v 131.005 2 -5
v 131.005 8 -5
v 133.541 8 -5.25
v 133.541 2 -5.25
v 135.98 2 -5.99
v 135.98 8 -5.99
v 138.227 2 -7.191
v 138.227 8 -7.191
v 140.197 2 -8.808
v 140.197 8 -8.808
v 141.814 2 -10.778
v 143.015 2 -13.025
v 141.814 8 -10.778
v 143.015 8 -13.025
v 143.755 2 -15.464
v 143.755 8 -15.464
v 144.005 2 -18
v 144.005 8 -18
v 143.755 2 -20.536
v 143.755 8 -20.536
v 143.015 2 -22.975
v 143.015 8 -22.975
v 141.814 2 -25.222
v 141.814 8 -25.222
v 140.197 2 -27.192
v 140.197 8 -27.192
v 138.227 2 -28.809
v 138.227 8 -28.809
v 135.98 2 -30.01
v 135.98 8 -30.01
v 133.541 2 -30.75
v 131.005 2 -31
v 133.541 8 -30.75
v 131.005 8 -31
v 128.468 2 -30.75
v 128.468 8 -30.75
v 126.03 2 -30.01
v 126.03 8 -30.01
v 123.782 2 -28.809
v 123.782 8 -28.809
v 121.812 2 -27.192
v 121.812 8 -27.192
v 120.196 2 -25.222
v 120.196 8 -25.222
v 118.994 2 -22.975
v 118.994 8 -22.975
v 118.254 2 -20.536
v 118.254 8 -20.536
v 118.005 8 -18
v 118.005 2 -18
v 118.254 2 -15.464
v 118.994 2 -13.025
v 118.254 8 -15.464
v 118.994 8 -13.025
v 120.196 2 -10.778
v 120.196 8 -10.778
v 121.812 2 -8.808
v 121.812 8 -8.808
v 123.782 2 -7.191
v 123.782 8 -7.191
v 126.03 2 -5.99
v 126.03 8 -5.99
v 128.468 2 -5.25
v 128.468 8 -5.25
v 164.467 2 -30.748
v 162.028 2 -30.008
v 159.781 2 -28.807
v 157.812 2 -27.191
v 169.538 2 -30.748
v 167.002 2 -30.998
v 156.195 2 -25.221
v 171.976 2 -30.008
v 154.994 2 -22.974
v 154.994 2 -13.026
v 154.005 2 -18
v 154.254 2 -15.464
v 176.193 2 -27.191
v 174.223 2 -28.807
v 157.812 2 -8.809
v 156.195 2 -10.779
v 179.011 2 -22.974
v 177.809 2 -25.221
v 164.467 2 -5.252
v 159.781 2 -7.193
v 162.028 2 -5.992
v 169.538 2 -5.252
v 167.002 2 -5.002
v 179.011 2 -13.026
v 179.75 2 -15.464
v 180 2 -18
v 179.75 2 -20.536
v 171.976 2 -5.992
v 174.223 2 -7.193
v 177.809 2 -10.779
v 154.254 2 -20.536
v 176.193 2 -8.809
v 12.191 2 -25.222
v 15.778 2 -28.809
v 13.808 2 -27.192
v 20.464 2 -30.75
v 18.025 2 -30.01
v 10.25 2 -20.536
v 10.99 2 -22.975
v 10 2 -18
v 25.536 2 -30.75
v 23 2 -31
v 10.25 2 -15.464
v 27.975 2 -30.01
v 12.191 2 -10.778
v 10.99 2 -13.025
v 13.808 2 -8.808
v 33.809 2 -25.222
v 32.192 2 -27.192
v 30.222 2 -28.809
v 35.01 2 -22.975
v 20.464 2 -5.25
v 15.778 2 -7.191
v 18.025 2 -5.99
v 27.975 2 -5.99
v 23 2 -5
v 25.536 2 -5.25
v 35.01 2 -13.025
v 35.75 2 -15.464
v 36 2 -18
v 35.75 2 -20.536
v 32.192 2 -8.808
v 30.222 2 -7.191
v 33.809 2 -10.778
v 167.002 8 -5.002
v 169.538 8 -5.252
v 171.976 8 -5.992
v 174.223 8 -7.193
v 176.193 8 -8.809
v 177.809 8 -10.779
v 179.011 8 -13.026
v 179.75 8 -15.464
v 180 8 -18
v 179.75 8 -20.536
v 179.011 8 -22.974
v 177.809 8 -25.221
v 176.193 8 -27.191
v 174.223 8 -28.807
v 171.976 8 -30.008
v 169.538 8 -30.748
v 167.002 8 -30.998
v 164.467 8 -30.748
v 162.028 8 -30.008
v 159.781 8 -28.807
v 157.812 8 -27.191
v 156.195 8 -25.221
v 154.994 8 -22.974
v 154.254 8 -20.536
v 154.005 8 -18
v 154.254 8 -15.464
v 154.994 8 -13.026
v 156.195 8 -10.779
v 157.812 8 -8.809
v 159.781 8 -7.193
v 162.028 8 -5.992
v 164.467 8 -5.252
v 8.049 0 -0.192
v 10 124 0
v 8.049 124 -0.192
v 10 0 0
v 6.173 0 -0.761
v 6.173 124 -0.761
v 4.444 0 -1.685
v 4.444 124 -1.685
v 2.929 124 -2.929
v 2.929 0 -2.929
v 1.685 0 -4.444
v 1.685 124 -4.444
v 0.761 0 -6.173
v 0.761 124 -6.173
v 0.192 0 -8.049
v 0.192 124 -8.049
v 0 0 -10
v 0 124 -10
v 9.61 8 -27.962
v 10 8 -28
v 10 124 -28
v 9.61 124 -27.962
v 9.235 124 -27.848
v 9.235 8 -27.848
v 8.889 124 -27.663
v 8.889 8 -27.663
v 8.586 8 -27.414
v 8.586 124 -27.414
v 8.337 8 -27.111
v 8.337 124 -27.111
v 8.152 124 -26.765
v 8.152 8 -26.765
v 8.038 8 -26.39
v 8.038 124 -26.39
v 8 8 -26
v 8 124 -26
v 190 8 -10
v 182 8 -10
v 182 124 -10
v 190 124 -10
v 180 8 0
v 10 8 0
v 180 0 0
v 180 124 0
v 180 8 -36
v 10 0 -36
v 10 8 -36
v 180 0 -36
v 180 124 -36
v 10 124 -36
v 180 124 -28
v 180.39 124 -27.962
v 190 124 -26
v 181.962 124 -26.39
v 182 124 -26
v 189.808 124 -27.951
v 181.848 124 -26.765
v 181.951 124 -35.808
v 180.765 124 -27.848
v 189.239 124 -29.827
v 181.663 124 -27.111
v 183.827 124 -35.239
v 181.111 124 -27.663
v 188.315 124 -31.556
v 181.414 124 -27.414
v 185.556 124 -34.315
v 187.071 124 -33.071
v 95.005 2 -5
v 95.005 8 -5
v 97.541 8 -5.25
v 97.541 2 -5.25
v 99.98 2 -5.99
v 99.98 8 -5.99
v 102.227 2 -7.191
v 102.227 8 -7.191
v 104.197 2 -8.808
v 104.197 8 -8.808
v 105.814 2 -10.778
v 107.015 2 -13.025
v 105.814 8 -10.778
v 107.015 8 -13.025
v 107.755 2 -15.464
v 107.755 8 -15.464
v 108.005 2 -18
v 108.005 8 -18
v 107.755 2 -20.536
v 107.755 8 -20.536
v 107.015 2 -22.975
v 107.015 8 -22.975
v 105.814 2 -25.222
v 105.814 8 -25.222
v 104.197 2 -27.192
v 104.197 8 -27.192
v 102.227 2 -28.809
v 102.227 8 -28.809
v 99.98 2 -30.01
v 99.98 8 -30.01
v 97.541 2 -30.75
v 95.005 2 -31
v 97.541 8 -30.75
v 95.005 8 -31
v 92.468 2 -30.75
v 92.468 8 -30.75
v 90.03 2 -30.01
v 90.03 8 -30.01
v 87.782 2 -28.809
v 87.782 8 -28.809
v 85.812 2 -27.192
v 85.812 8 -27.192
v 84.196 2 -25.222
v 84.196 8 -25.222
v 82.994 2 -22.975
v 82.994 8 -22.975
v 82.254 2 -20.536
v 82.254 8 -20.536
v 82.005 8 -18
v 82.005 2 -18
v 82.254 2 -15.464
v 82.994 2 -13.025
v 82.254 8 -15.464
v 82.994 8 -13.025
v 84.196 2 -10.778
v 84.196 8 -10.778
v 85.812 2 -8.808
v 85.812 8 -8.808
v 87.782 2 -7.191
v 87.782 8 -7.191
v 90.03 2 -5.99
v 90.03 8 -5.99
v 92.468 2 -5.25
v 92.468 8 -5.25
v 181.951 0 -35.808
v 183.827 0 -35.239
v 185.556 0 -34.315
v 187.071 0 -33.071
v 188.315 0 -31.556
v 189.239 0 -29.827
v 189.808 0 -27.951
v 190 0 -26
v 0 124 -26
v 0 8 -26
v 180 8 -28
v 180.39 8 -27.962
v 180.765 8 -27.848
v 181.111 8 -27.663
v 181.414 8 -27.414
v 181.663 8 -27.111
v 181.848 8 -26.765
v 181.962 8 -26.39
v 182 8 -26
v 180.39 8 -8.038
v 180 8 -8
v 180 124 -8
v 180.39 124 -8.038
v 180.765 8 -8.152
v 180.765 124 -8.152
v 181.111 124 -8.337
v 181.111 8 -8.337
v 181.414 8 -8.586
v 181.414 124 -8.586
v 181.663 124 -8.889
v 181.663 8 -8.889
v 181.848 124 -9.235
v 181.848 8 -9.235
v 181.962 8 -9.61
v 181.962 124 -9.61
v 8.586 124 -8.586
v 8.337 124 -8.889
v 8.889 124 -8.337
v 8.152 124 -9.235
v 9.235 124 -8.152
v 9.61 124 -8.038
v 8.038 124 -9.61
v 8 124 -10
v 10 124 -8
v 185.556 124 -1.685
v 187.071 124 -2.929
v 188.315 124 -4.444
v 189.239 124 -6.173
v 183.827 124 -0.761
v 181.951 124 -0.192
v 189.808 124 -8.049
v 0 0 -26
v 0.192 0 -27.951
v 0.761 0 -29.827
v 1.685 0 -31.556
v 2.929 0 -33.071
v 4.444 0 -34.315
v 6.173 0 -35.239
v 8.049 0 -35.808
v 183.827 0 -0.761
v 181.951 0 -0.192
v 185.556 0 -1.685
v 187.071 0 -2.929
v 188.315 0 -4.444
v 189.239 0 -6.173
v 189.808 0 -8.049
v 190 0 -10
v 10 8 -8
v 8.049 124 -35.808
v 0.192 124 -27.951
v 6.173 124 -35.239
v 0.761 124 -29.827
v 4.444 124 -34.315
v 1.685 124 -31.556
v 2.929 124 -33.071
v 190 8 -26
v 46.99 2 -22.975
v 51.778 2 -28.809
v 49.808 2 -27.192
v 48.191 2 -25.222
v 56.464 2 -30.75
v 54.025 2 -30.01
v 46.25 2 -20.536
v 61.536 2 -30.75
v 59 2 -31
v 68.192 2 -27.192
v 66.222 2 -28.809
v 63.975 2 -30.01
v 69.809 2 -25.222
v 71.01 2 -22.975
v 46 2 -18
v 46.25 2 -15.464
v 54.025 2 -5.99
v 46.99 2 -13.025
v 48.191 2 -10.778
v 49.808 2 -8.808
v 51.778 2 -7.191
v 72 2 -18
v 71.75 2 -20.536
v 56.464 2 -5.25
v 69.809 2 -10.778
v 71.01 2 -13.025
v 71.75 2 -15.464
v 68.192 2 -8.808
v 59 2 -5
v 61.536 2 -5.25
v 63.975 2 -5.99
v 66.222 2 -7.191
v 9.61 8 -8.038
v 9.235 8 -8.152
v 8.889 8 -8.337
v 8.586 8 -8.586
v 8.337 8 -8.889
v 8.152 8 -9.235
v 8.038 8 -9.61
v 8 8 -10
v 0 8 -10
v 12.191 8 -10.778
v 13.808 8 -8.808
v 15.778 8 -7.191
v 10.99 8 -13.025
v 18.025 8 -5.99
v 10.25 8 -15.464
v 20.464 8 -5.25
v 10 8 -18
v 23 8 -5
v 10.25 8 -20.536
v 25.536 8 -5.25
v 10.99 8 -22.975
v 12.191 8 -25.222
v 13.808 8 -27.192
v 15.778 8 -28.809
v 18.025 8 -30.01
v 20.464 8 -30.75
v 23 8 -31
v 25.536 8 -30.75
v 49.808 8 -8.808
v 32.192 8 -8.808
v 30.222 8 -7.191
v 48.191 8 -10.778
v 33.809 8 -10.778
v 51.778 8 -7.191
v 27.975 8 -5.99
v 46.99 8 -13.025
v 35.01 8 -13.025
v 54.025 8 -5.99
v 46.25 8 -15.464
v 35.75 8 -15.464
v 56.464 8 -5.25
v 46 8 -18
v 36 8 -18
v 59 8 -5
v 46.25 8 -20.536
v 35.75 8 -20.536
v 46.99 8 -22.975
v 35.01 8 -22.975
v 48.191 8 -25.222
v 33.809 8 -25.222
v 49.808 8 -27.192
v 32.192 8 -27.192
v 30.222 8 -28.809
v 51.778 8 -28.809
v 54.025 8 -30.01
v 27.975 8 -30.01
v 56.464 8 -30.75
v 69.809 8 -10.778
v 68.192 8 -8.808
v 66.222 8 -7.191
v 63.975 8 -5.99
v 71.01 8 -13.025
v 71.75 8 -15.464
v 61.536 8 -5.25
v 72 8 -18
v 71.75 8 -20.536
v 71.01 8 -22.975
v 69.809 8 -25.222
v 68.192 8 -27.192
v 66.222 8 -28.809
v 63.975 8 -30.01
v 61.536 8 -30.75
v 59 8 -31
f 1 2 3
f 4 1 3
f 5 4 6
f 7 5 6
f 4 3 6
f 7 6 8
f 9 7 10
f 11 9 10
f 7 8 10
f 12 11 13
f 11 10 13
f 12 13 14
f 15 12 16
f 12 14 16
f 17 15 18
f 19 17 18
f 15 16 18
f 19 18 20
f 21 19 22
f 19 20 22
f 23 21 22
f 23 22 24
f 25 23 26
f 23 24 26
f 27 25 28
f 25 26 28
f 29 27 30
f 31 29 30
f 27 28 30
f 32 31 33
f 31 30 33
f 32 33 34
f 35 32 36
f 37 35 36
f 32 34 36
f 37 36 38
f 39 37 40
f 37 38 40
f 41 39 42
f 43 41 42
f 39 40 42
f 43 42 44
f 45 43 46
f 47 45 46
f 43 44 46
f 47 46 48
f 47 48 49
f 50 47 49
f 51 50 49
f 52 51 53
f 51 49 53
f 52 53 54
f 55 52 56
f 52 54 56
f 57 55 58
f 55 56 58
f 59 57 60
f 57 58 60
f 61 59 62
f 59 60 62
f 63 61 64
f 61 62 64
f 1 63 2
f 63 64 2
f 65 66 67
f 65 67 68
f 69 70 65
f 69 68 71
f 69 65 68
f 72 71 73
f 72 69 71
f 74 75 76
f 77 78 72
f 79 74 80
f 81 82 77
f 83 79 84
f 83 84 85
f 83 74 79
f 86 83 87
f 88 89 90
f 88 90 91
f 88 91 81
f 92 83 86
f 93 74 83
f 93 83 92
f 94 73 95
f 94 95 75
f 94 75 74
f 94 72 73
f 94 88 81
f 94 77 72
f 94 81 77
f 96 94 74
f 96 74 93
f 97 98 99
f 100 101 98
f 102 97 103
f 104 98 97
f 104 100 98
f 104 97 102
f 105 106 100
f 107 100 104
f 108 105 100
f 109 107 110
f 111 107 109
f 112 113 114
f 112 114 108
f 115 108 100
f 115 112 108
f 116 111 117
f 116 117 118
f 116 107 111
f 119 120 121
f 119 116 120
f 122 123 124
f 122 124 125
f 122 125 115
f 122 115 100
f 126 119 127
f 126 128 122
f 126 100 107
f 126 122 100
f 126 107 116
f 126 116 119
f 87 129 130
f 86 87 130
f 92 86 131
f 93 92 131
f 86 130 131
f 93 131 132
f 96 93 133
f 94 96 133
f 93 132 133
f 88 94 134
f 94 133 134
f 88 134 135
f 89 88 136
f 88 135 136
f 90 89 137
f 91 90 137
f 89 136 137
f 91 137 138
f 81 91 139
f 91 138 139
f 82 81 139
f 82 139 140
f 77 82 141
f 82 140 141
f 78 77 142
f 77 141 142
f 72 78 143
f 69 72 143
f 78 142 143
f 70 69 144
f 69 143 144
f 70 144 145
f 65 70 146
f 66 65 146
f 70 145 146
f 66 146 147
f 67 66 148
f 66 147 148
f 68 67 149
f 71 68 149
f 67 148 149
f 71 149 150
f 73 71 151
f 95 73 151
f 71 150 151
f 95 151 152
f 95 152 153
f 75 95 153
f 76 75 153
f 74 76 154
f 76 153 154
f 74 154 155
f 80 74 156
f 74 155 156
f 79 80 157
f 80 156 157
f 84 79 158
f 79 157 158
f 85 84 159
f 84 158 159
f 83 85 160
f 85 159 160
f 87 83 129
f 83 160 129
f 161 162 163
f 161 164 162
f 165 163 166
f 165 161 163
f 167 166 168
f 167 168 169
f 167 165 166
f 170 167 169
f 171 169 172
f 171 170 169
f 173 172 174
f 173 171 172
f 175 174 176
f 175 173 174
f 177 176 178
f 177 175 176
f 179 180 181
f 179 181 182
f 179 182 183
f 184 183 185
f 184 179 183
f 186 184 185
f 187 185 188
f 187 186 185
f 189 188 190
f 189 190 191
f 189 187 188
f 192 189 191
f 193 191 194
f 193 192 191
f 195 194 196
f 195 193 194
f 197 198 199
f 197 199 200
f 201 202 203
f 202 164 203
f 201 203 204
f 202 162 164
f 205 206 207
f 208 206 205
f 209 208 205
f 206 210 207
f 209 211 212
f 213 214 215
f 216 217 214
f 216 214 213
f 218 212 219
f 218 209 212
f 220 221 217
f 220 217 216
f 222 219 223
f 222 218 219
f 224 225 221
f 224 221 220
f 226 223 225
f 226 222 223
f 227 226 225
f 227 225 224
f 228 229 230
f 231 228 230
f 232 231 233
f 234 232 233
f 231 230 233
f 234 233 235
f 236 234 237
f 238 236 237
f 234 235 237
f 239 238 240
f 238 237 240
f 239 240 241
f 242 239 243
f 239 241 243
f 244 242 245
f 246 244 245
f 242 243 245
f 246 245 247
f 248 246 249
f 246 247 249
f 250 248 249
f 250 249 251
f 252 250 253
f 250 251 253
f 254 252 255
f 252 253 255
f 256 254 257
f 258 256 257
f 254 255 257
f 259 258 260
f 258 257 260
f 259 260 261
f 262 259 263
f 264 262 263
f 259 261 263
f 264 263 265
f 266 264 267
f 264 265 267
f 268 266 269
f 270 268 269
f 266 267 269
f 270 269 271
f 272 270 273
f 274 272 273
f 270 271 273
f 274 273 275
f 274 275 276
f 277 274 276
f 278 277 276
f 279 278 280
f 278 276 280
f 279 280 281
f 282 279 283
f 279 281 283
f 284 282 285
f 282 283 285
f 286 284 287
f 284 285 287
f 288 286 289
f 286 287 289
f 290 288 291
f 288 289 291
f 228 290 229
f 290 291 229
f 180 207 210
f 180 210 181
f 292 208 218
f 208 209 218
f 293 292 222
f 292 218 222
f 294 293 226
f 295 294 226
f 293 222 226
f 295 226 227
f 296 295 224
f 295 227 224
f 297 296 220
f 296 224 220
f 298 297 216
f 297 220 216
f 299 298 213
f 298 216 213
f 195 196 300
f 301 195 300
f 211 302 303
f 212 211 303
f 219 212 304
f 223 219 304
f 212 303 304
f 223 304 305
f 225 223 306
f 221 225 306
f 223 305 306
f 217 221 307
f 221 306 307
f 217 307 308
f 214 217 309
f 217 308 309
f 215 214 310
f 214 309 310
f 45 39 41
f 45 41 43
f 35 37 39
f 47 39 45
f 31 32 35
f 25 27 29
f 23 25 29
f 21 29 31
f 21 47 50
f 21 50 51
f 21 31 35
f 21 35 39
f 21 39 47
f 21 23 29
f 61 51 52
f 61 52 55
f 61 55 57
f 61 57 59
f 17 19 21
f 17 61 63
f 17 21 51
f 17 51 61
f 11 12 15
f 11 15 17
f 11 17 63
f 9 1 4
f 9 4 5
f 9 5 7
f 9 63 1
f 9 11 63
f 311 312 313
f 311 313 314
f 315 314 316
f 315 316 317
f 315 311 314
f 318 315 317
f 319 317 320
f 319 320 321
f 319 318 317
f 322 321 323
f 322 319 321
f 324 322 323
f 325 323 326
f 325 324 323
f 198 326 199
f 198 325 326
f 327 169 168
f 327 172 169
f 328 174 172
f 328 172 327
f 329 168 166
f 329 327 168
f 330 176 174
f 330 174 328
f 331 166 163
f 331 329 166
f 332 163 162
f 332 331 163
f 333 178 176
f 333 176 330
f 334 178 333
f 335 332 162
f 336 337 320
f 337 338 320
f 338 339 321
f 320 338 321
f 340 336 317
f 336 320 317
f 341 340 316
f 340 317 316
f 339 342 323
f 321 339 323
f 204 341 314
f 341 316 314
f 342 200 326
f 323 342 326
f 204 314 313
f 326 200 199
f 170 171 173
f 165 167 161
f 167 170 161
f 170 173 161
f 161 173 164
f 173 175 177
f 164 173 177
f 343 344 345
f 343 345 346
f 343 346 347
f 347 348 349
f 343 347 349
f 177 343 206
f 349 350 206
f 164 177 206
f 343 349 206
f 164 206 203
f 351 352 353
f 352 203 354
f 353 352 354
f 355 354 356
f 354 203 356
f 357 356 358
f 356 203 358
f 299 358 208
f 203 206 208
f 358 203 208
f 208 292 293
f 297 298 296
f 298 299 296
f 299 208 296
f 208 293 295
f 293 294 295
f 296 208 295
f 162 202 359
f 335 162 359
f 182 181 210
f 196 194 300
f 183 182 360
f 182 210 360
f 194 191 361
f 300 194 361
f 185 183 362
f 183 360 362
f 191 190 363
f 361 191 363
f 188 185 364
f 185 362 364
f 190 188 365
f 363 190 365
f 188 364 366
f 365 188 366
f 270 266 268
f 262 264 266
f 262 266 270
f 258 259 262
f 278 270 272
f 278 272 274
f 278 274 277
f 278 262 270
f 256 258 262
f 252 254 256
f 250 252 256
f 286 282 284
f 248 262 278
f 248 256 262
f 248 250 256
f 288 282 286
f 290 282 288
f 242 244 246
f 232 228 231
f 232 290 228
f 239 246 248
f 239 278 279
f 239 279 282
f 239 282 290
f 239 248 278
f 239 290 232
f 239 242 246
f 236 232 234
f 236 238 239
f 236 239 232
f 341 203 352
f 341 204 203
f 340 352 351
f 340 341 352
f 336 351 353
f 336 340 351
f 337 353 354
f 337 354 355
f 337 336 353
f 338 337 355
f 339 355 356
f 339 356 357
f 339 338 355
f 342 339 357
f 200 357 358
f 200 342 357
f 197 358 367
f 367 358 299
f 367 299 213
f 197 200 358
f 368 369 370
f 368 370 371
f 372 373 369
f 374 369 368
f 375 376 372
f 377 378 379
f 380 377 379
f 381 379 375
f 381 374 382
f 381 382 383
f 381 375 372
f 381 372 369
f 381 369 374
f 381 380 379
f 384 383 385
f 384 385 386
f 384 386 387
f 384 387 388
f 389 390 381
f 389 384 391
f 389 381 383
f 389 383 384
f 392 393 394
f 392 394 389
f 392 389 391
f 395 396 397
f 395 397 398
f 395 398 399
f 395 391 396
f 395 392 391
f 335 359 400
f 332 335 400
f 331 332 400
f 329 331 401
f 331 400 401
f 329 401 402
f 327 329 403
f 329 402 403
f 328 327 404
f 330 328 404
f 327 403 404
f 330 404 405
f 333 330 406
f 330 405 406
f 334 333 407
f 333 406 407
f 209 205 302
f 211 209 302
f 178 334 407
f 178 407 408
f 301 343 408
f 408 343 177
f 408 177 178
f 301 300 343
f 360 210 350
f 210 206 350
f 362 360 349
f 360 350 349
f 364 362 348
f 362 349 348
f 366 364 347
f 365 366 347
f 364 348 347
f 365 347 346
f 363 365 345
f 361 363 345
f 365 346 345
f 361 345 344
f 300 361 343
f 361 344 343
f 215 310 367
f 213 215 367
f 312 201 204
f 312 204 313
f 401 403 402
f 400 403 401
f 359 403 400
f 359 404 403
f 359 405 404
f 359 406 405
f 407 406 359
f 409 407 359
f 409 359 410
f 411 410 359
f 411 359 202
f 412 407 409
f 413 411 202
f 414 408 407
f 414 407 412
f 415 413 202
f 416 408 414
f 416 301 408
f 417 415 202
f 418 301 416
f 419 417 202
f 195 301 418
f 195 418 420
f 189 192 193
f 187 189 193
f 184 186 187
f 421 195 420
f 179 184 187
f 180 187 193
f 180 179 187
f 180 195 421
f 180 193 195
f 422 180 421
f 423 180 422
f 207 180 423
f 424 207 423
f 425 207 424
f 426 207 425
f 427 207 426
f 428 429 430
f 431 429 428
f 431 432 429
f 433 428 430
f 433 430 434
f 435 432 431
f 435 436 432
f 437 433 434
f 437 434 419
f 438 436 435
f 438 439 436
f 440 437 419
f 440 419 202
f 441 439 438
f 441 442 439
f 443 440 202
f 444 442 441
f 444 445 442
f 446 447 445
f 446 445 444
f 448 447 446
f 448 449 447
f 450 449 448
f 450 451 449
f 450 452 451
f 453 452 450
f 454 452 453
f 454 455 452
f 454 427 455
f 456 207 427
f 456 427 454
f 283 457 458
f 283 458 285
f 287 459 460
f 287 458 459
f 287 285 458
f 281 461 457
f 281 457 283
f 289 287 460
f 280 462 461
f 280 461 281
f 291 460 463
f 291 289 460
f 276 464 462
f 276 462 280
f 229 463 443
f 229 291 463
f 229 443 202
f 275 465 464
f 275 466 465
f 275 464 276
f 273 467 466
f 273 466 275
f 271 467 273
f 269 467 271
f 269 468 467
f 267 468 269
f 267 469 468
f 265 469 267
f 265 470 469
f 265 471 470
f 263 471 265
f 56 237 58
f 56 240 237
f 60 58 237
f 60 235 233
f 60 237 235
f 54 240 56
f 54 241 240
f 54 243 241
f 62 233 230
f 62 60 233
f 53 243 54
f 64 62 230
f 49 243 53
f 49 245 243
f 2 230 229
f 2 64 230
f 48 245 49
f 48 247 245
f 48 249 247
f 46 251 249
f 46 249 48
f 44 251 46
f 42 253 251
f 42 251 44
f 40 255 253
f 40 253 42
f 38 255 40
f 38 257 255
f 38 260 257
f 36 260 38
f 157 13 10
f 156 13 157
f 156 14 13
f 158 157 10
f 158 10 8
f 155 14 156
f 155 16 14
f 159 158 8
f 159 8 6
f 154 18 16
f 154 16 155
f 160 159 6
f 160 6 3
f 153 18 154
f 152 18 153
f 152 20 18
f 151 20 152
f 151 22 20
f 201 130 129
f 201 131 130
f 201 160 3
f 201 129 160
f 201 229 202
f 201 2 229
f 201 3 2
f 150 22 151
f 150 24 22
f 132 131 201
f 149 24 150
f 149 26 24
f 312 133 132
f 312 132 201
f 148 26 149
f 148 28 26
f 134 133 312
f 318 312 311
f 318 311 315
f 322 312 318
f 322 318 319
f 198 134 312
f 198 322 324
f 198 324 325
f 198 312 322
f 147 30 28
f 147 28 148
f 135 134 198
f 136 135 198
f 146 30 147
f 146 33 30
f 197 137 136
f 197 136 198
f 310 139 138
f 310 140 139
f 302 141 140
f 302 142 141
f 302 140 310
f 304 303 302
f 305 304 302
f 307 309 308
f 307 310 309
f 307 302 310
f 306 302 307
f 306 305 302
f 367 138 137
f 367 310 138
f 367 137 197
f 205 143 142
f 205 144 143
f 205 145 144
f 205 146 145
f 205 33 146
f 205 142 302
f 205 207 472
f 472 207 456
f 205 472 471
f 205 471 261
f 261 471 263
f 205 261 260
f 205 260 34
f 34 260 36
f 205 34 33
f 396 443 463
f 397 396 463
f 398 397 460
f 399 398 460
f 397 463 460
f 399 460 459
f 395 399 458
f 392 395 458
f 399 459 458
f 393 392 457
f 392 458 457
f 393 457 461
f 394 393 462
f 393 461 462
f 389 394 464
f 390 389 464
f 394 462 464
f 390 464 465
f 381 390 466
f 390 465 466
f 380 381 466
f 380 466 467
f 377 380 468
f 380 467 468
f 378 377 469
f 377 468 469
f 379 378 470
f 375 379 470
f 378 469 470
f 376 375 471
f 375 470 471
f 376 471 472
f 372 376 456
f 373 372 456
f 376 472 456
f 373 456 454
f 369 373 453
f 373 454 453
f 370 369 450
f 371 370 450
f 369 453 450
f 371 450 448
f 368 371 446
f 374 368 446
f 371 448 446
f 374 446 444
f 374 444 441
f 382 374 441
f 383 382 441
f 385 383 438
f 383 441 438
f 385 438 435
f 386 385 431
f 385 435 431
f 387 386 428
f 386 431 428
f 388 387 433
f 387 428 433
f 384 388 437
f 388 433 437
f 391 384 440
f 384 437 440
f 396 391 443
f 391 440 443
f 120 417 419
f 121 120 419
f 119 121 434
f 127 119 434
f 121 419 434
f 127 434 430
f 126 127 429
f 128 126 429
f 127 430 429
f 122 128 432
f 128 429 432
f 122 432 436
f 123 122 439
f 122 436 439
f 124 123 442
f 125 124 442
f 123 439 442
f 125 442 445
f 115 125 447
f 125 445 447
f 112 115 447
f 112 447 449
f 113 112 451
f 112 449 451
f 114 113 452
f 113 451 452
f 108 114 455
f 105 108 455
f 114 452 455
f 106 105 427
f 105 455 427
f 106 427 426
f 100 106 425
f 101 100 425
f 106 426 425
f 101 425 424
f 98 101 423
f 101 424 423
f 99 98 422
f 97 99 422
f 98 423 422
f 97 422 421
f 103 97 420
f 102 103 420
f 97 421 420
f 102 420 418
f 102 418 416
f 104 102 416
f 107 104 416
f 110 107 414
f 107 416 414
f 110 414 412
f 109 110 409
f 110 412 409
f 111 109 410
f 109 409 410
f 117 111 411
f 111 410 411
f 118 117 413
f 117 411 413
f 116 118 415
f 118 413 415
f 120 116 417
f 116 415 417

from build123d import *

# Parameters (mm, degrees)
SKETCH5_W           = 190
SKETCH5_H           = 36
BOSS_EXTRUDE1_DEPTH = 8
SKETCH6_R           = 13
SKETCH6_R_2         = 12.99768992
CUT_EXTRUDE1_DEPTH  = 6
BOSS_EXTRUDE2_DEPTH = 116
FILLET1_R           = 10


with BuildPart() as part:
    # Sketch5 → Boss-Extrude1 (new body)
    with BuildSketch(Plane(origin=(0, 0, 0), x_dir=(1, 0, 0), z_dir=(0, 1, 0))):
        with Locations((95, 18)):
            Rectangle(SKETCH5_W, SKETCH5_H)
    extrude(amount=BOSS_EXTRUDE1_DEPTH)

    # Sketch6 → Cut-Extrude1 (cut)
    with BuildSketch(Plane(origin=(0, 8, 0), x_dir=(1, 0, 0), z_dir=(0, 1, 0))):
        with Locations(Location((23, 18, 0), (0, 0, 270))):
            Circle(SKETCH6_R)
        with Locations(Location((59, 18, 0), (0, 0, 270))):
            Circle(SKETCH6_R)
        with Locations(Location((95.004620161, 18, 0), (0, 0, 270))):
            Circle(SKETCH6_R)
        with Locations(Location((131.004620161, 18, 0), (0, 0, 270))):
            Circle(SKETCH6_R)
        with Locations(Location((167.00231008, 18, 0), (0, 0, 270))):
            Circle(SKETCH6_R_2)
    extrude(amount=-CUT_EXTRUDE1_DEPTH, mode=Mode.SUBTRACT)

    # Sketch7 → Boss-Extrude2 (add)
    with BuildSketch(Plane(origin=(0, 8, 0), x_dir=(1, 0, 0), z_dir=(0, 1, 0))):
        with BuildLine():
            Line((0, 0), (10, 0))
            Line((10, 0), (10, 8))
            ThreePointArc((10, 8), (8.585786438, 8.585786438), (8, 10))
            Line((8, 10), (0, 10))
            Line((0, 10), (0, 0))
        make_face()
        with BuildLine():
            Line((0, 36), (10, 36))
            Line((10, 36), (10, 28))
            ThreePointArc((10, 28), (8.585786438, 27.414213562), (8, 26))
            Line((8, 26), (0, 26))
            Line((0, 26), (0, 36))
        make_face()
        with BuildLine():
            Line((190, 36), (180, 36))
            Line((180, 36), (180, 28))
            ThreePointArc((180, 28), (181.414213562, 27.414213562), (182, 26))
            Line((182, 26), (190, 26))
            Line((190, 26), (190, 36))
        make_face()
        with BuildLine():
            Line((190, 0), (180, 0))
            Line((180, 0), (180, 8))
            ThreePointArc((180, 8), (181.414213562, 8.585786438), (182, 10))
            Line((182, 10), (190, 10))
            Line((190, 10), (190, 0))
        make_face()
    extrude(amount=BOSS_EXTRUDE2_DEPTH)

    # Fillet1
    fillet1_edges = [part.edges().sort_by_distance(p)[0] for p in [
        (190, 62, 0),
        (190, 62, -36),
        (0, 62, -36),
        (0, 62, 0),
    ]]
    fillet(fillet1_edges, radius=FILLET1_R - 0.0001)  # a hair under: the kernel refuses the full size


solid = part.part
